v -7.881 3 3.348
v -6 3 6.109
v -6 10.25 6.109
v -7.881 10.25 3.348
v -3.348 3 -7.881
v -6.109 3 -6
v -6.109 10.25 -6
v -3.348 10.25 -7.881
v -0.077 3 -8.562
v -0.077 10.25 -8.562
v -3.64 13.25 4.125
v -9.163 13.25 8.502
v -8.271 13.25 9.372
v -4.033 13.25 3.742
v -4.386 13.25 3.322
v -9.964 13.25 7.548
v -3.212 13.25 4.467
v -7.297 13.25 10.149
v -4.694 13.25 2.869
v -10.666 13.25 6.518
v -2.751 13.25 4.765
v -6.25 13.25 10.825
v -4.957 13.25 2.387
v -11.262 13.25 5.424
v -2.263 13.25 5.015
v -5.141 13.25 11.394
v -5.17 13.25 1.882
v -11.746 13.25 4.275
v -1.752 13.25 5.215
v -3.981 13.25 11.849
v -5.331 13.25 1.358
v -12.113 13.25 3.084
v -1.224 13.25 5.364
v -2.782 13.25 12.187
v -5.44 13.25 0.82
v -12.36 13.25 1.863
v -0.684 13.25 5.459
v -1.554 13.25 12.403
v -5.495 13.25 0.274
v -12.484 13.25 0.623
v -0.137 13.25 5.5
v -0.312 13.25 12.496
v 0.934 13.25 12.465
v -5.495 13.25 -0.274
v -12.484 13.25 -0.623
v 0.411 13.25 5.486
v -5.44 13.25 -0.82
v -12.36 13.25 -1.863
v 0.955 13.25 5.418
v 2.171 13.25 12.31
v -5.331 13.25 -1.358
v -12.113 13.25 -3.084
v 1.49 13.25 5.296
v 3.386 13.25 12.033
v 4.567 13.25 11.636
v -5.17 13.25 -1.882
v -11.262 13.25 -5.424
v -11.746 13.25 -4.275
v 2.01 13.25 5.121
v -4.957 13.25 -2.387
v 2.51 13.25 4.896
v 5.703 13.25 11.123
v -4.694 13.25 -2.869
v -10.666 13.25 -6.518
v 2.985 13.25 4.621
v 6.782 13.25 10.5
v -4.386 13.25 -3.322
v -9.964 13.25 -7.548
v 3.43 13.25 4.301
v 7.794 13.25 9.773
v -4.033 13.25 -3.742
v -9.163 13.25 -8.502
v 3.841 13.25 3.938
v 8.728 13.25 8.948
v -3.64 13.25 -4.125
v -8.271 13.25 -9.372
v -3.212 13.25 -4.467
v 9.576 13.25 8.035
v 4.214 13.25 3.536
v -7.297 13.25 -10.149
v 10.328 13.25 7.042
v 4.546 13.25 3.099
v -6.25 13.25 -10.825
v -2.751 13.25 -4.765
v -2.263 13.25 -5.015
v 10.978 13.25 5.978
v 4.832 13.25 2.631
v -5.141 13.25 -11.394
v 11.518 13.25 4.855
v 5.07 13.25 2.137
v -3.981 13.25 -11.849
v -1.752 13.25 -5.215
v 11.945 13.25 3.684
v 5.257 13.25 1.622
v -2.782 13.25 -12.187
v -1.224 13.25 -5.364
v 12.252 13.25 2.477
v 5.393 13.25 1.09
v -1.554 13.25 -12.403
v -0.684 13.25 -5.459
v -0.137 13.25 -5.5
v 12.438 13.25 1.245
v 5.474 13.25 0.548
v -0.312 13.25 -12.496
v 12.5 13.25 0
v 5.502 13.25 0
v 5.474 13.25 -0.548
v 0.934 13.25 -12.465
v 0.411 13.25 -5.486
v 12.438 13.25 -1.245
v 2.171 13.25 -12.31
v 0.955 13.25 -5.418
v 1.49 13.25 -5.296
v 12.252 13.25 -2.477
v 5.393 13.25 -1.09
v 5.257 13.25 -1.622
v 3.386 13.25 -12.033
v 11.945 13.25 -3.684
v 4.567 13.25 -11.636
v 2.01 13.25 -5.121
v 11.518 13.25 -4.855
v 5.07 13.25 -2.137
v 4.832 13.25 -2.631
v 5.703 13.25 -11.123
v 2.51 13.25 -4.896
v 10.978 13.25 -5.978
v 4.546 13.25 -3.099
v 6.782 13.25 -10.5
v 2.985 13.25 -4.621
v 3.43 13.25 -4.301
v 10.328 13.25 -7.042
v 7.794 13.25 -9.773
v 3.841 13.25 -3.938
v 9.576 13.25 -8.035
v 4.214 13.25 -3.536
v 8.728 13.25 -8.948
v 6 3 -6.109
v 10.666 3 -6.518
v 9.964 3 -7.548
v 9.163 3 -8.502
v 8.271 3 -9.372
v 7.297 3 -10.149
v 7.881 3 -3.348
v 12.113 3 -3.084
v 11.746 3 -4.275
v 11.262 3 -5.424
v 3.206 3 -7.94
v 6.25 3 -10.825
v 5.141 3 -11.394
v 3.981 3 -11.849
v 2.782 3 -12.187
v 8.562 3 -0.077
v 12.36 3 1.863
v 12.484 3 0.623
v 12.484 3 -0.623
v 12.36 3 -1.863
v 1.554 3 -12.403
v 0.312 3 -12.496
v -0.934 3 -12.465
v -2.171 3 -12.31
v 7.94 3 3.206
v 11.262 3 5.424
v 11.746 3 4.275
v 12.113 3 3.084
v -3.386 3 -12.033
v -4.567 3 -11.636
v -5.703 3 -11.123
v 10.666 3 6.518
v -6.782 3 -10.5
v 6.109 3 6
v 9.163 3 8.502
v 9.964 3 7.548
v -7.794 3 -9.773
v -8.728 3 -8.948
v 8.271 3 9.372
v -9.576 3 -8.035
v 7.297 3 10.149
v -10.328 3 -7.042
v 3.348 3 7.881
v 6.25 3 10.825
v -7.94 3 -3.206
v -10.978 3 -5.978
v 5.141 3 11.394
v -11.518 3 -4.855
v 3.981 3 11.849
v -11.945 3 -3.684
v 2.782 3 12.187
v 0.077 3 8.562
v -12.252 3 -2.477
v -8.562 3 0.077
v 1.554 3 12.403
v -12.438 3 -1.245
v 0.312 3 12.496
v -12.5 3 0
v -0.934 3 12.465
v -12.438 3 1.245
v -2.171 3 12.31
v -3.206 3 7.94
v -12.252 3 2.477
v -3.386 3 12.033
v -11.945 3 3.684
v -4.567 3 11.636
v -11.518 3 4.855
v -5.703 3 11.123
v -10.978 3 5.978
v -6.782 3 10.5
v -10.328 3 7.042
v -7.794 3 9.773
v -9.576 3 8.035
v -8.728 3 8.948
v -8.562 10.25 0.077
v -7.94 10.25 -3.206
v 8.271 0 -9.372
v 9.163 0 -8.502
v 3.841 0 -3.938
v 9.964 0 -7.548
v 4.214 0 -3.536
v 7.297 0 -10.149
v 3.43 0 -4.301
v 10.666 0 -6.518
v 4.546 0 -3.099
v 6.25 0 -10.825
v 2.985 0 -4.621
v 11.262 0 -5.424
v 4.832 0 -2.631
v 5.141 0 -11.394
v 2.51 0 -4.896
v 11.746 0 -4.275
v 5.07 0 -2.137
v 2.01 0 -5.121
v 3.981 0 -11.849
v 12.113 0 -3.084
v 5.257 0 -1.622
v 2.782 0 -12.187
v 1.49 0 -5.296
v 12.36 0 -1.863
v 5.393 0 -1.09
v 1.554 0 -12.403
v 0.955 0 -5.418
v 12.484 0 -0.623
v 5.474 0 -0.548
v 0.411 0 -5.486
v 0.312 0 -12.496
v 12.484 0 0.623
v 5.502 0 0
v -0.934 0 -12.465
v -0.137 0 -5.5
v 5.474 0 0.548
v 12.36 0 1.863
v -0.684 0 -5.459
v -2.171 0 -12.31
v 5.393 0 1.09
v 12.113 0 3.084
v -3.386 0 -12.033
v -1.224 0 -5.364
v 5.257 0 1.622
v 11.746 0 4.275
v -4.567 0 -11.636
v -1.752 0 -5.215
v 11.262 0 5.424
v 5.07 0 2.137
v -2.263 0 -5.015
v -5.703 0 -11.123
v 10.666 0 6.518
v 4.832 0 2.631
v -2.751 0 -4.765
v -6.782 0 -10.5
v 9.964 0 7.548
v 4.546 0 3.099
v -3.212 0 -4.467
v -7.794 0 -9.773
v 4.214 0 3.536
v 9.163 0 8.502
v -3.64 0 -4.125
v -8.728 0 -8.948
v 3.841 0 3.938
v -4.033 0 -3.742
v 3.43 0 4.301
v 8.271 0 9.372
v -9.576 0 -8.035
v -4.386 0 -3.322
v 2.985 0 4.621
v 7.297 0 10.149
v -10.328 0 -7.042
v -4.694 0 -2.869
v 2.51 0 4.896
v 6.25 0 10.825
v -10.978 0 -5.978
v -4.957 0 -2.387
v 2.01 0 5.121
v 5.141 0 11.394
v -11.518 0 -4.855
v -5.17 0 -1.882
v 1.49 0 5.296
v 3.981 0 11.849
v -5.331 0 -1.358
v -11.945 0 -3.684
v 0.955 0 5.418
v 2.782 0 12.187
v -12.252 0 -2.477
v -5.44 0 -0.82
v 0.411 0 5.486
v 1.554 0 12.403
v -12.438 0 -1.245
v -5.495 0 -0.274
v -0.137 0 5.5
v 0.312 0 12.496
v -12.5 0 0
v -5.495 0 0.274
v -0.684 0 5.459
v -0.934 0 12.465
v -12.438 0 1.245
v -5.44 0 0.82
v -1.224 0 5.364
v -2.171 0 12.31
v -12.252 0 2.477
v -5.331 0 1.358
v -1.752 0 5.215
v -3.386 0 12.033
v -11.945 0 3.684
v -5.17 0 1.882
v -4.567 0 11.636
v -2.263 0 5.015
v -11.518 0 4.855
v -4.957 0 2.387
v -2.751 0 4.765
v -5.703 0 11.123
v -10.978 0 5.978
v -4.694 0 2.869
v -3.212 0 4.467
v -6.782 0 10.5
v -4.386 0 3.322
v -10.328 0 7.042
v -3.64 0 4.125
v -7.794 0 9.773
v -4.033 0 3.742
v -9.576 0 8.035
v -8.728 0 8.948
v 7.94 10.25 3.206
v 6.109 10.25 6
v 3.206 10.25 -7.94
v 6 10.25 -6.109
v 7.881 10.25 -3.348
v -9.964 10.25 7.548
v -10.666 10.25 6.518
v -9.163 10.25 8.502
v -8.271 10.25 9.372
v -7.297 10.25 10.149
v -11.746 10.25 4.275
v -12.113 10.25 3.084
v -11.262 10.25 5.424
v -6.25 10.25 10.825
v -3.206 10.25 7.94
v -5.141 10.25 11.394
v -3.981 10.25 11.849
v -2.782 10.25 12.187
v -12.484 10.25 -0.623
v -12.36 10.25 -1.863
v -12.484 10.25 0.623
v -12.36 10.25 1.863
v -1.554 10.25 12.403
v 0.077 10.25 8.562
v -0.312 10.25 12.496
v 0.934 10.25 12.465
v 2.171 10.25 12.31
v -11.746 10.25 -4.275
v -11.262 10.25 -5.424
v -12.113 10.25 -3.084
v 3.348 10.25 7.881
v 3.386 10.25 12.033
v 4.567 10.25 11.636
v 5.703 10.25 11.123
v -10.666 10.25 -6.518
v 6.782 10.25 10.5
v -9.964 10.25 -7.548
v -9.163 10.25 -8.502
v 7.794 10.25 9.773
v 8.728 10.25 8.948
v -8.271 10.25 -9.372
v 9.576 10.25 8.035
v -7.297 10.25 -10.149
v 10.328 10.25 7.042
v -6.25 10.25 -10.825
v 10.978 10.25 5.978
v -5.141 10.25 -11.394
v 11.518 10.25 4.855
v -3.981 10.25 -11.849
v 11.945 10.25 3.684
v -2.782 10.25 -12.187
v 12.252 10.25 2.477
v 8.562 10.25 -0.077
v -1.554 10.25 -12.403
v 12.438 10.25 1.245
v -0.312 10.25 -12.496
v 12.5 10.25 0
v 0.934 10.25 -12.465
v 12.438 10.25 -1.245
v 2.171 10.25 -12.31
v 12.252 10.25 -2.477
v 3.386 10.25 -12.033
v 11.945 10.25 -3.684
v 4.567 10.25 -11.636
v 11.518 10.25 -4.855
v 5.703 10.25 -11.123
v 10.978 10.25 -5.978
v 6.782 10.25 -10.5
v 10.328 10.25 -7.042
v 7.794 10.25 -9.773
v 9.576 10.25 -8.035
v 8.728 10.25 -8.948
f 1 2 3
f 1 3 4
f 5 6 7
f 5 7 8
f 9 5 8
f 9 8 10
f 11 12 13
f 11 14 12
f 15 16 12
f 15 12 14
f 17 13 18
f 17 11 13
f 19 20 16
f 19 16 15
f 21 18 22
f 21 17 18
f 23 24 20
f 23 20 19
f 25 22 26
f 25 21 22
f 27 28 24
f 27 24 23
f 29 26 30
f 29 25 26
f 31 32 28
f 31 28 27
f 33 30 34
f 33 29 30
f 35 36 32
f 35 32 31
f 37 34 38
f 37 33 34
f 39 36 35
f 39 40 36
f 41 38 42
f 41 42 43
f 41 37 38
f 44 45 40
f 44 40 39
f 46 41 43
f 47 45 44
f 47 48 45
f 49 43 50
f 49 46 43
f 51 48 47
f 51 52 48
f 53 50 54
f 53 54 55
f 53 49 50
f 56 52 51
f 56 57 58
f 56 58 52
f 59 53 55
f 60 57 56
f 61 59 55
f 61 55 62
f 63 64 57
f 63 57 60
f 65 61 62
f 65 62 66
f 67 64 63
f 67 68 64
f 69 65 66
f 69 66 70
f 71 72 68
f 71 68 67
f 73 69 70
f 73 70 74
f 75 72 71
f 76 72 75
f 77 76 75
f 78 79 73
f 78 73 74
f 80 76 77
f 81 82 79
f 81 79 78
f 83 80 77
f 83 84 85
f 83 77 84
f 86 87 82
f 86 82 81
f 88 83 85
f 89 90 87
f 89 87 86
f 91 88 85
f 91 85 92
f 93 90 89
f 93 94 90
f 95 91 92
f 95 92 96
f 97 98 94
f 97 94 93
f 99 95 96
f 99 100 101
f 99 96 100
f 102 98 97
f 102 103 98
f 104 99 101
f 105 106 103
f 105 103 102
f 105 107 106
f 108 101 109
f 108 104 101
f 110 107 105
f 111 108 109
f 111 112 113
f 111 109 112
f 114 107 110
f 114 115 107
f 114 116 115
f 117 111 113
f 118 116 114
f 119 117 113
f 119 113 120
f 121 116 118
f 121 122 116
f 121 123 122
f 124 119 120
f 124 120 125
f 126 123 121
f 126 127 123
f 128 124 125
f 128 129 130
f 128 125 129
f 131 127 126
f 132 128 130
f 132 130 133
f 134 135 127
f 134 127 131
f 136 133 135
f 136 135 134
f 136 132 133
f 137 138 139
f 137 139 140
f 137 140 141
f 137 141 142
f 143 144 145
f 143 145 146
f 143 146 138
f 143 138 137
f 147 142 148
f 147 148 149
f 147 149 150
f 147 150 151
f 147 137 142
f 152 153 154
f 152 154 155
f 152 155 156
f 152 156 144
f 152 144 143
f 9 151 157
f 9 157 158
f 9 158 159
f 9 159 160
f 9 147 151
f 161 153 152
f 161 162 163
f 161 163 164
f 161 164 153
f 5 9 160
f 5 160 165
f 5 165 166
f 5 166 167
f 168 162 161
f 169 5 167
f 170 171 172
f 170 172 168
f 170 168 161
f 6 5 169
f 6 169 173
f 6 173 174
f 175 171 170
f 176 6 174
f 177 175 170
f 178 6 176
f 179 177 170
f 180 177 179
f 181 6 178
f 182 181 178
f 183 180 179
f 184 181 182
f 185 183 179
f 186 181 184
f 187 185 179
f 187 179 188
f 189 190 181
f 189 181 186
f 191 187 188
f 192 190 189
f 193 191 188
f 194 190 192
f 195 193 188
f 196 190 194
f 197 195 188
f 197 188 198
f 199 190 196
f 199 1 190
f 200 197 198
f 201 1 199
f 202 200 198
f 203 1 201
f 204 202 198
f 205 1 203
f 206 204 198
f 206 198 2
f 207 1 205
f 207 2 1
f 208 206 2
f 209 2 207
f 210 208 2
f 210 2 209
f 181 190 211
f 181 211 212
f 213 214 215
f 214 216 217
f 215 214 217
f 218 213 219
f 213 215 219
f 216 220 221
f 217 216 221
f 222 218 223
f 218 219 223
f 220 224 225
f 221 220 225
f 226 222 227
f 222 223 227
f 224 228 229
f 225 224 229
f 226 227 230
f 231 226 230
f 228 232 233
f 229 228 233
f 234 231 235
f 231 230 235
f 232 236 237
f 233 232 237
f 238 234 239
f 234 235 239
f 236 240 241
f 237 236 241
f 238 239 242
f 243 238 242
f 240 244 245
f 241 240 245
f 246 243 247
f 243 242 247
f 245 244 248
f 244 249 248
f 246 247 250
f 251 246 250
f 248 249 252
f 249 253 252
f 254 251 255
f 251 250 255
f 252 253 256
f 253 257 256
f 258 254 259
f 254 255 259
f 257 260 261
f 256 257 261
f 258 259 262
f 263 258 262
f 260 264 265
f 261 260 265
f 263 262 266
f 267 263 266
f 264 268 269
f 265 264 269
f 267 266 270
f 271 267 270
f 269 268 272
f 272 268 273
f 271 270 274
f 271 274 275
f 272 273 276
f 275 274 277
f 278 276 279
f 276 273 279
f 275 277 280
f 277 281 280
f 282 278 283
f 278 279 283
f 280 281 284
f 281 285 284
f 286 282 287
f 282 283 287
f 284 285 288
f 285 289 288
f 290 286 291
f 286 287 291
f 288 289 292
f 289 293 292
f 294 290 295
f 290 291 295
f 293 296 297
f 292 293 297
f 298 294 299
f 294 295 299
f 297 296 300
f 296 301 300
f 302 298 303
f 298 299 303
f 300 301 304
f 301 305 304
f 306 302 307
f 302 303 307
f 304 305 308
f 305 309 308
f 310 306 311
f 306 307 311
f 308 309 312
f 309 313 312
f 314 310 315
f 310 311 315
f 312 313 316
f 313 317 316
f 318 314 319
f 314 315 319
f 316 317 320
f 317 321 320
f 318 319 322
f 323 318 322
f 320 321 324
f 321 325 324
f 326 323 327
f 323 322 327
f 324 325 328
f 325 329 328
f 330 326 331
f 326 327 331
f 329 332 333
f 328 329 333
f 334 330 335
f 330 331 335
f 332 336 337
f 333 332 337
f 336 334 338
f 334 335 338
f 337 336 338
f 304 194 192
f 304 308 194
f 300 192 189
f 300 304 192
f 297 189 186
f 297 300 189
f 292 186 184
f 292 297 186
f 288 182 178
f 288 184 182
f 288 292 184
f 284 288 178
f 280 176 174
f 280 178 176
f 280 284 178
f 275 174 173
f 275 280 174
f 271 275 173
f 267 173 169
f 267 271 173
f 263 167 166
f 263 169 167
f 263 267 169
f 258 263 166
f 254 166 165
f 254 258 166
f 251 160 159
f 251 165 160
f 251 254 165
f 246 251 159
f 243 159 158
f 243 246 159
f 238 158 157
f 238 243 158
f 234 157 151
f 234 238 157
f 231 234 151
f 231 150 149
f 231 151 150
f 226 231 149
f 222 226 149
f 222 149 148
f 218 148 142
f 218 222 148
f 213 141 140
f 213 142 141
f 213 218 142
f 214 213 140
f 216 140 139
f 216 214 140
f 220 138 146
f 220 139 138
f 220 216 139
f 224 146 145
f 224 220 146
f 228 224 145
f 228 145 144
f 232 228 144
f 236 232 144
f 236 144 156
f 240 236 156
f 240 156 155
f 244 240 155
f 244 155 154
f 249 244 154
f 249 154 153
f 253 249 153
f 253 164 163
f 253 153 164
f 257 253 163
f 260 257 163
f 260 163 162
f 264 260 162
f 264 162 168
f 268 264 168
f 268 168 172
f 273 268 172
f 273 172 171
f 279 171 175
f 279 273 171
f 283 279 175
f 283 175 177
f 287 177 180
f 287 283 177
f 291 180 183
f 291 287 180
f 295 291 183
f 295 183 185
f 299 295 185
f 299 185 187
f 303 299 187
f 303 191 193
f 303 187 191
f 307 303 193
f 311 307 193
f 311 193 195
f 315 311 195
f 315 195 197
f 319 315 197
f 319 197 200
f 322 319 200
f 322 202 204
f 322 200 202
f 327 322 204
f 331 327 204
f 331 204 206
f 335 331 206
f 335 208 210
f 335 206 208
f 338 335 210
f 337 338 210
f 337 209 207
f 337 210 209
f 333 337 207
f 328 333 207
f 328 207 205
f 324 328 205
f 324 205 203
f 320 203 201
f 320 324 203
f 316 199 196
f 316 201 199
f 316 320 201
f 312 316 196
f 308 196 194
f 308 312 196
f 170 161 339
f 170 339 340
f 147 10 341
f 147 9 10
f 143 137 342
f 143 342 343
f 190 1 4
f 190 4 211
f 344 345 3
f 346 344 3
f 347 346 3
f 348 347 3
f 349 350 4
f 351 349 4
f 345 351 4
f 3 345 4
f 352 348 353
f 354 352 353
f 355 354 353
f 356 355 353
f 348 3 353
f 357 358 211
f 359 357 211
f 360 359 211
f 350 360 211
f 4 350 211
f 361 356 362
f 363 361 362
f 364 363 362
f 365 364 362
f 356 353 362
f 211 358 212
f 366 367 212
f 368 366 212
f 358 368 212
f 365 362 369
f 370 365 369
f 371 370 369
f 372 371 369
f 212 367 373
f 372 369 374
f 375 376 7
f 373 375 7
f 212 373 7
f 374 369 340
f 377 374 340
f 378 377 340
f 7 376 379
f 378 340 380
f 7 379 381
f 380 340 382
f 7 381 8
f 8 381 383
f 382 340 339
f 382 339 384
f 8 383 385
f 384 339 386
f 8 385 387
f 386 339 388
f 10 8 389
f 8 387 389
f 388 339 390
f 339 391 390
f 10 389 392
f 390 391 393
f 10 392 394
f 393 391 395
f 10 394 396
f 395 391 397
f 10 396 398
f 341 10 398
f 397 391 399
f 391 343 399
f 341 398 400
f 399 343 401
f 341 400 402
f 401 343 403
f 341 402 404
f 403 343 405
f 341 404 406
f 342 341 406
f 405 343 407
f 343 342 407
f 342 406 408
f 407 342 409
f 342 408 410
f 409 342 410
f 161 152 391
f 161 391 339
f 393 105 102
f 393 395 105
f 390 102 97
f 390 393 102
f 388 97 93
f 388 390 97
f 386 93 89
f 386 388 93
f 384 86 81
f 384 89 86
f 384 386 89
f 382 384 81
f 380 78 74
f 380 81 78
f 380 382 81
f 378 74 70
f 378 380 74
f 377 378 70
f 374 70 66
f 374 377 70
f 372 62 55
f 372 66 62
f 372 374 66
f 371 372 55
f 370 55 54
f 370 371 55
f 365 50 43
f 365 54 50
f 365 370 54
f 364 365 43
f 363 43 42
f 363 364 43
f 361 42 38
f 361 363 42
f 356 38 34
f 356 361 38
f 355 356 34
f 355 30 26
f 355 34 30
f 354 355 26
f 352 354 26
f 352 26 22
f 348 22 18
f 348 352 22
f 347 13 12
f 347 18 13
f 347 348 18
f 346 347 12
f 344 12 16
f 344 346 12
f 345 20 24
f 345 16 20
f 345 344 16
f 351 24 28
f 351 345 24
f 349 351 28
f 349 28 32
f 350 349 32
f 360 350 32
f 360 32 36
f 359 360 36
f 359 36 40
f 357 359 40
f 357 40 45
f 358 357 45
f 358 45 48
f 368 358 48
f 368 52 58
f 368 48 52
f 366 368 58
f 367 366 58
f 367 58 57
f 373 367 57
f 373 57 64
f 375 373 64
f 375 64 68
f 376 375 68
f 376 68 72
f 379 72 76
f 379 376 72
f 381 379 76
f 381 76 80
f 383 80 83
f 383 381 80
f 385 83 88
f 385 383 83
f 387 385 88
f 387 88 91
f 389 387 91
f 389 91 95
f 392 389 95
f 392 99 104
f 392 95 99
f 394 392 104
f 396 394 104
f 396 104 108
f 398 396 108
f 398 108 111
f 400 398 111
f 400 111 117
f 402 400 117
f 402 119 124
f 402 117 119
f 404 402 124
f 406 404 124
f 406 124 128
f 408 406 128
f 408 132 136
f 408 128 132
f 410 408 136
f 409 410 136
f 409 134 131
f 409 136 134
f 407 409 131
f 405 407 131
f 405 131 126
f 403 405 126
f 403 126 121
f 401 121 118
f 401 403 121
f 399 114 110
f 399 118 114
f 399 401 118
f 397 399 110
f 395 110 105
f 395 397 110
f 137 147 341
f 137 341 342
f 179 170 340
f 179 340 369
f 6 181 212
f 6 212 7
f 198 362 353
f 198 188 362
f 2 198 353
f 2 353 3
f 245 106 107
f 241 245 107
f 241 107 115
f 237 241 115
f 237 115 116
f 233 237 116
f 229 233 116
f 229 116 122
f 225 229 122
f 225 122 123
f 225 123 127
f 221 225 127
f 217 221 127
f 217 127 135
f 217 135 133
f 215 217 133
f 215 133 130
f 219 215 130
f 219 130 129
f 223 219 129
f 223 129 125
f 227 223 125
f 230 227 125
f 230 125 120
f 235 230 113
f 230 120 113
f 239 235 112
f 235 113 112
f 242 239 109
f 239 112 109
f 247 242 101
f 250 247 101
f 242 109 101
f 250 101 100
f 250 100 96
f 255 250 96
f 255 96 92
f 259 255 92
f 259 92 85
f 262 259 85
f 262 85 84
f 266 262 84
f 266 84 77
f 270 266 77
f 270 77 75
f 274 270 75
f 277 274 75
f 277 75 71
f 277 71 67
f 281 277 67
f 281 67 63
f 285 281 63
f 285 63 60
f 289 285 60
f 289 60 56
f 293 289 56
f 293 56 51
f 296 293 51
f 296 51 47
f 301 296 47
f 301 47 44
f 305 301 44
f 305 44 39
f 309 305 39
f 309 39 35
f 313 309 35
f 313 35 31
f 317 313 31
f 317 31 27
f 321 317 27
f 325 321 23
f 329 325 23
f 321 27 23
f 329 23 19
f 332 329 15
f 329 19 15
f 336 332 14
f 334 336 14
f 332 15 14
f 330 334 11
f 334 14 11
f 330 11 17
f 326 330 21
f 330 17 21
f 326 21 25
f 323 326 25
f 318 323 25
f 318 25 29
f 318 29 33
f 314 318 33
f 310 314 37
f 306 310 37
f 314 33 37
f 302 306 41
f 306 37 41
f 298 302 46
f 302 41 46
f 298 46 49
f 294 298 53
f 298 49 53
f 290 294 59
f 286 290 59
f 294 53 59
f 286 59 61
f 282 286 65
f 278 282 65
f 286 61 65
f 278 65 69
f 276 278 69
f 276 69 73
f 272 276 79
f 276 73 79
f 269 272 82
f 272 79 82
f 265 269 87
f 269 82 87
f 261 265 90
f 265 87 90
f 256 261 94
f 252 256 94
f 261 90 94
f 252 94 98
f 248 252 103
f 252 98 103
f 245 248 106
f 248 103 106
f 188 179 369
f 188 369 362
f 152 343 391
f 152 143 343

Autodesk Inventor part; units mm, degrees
ref_plane "YZ Plane" through (0, 0, 0) normal (1, 0, 0) x (0, 1, 0)
ref_plane "XZ Plane" through (0, 0, 0) normal (0, 1, 0) x (-1, 0, 0)
ref_plane "XY Plane" through (0, 0, 0) normal (0, 0, 1) x (1, 0, 0)
sketch "Szkic1" plane through (0, 0, 0) normal (0, 1, 0) x (-1, 0, 0)
  circle A0 centre (0, 0) radius 12.5
  dimension "d0" = 25
extrude "Wyciągnięcie proste1" add sketch "Szkic1" along normal blind 3
sketch "Szkic7" plane through (0, 3, 0) normal (0, 1, 0) x (1, 0, 0)
  line L0 (6, 6.109) -> (7.8811, 3.3479)
  line L1 (7.8811, 3.3479) -> (8.5624, 0.0771)
  line L2 (8.5624, 0.0771) -> (7.9401, -3.2055)
  line L3 (7.9401, -3.2055) -> (6.109, -6)
  line L4 (6.109, -6) -> (3.3479, -7.8811)
  line L5 (3.3479, -7.8811) -> (0.0771, -8.5624)
  line L6 (0.0771, -8.5624) -> (-3.2055, -7.9401)
  line L7 (-3.2055, -7.9401) -> (-6, -6.109)
  line L8 (-6, -6.109) -> (-7.8811, -3.3479)
  line L9 (-7.8811, -3.3479) -> (-8.5624, -0.0771)
  line L10 (-8.5624, -0.0771) -> (-7.9401, 3.2055)
  line L11 (-7.9401, 3.2055) -> (-6.109, 6)
  line L12 (-6.109, 6) -> (-3.3479, 7.8811)
  line L13 (-3.3479, 7.8811) -> (-0.0771, 8.5624)
  line L14 (-0.0771, 8.5624) -> (3.2055, 7.9401)
  line L15 (3.2055, 7.9401) -> (6, 6.109)
  point P0 (0, 0)
  point P1 (0, 0)
extrude "Wyciągnięcie proste6" add sketch "Szkic7" along normal blind 7.25
sketch "Szkic8" plane through (0, 10.25, 0) normal (0, 1, 0) x (1, 0, 0)
  circle A0 centre (0, 0) radius 12.5
extrude "Wyciągnięcie proste7" add sketch "Szkic8" along normal blind 3
sketch "Szkic9" plane through (0, 13.25, 0) normal (0, 1, 0) x (1, 0, 0)
  circle A0 centre (0, 0) radius 5.5016
extrude "Wyciągnięcie proste8" cut sketch "Szkic9" against normal blind 30
properties part number "spool_short"
